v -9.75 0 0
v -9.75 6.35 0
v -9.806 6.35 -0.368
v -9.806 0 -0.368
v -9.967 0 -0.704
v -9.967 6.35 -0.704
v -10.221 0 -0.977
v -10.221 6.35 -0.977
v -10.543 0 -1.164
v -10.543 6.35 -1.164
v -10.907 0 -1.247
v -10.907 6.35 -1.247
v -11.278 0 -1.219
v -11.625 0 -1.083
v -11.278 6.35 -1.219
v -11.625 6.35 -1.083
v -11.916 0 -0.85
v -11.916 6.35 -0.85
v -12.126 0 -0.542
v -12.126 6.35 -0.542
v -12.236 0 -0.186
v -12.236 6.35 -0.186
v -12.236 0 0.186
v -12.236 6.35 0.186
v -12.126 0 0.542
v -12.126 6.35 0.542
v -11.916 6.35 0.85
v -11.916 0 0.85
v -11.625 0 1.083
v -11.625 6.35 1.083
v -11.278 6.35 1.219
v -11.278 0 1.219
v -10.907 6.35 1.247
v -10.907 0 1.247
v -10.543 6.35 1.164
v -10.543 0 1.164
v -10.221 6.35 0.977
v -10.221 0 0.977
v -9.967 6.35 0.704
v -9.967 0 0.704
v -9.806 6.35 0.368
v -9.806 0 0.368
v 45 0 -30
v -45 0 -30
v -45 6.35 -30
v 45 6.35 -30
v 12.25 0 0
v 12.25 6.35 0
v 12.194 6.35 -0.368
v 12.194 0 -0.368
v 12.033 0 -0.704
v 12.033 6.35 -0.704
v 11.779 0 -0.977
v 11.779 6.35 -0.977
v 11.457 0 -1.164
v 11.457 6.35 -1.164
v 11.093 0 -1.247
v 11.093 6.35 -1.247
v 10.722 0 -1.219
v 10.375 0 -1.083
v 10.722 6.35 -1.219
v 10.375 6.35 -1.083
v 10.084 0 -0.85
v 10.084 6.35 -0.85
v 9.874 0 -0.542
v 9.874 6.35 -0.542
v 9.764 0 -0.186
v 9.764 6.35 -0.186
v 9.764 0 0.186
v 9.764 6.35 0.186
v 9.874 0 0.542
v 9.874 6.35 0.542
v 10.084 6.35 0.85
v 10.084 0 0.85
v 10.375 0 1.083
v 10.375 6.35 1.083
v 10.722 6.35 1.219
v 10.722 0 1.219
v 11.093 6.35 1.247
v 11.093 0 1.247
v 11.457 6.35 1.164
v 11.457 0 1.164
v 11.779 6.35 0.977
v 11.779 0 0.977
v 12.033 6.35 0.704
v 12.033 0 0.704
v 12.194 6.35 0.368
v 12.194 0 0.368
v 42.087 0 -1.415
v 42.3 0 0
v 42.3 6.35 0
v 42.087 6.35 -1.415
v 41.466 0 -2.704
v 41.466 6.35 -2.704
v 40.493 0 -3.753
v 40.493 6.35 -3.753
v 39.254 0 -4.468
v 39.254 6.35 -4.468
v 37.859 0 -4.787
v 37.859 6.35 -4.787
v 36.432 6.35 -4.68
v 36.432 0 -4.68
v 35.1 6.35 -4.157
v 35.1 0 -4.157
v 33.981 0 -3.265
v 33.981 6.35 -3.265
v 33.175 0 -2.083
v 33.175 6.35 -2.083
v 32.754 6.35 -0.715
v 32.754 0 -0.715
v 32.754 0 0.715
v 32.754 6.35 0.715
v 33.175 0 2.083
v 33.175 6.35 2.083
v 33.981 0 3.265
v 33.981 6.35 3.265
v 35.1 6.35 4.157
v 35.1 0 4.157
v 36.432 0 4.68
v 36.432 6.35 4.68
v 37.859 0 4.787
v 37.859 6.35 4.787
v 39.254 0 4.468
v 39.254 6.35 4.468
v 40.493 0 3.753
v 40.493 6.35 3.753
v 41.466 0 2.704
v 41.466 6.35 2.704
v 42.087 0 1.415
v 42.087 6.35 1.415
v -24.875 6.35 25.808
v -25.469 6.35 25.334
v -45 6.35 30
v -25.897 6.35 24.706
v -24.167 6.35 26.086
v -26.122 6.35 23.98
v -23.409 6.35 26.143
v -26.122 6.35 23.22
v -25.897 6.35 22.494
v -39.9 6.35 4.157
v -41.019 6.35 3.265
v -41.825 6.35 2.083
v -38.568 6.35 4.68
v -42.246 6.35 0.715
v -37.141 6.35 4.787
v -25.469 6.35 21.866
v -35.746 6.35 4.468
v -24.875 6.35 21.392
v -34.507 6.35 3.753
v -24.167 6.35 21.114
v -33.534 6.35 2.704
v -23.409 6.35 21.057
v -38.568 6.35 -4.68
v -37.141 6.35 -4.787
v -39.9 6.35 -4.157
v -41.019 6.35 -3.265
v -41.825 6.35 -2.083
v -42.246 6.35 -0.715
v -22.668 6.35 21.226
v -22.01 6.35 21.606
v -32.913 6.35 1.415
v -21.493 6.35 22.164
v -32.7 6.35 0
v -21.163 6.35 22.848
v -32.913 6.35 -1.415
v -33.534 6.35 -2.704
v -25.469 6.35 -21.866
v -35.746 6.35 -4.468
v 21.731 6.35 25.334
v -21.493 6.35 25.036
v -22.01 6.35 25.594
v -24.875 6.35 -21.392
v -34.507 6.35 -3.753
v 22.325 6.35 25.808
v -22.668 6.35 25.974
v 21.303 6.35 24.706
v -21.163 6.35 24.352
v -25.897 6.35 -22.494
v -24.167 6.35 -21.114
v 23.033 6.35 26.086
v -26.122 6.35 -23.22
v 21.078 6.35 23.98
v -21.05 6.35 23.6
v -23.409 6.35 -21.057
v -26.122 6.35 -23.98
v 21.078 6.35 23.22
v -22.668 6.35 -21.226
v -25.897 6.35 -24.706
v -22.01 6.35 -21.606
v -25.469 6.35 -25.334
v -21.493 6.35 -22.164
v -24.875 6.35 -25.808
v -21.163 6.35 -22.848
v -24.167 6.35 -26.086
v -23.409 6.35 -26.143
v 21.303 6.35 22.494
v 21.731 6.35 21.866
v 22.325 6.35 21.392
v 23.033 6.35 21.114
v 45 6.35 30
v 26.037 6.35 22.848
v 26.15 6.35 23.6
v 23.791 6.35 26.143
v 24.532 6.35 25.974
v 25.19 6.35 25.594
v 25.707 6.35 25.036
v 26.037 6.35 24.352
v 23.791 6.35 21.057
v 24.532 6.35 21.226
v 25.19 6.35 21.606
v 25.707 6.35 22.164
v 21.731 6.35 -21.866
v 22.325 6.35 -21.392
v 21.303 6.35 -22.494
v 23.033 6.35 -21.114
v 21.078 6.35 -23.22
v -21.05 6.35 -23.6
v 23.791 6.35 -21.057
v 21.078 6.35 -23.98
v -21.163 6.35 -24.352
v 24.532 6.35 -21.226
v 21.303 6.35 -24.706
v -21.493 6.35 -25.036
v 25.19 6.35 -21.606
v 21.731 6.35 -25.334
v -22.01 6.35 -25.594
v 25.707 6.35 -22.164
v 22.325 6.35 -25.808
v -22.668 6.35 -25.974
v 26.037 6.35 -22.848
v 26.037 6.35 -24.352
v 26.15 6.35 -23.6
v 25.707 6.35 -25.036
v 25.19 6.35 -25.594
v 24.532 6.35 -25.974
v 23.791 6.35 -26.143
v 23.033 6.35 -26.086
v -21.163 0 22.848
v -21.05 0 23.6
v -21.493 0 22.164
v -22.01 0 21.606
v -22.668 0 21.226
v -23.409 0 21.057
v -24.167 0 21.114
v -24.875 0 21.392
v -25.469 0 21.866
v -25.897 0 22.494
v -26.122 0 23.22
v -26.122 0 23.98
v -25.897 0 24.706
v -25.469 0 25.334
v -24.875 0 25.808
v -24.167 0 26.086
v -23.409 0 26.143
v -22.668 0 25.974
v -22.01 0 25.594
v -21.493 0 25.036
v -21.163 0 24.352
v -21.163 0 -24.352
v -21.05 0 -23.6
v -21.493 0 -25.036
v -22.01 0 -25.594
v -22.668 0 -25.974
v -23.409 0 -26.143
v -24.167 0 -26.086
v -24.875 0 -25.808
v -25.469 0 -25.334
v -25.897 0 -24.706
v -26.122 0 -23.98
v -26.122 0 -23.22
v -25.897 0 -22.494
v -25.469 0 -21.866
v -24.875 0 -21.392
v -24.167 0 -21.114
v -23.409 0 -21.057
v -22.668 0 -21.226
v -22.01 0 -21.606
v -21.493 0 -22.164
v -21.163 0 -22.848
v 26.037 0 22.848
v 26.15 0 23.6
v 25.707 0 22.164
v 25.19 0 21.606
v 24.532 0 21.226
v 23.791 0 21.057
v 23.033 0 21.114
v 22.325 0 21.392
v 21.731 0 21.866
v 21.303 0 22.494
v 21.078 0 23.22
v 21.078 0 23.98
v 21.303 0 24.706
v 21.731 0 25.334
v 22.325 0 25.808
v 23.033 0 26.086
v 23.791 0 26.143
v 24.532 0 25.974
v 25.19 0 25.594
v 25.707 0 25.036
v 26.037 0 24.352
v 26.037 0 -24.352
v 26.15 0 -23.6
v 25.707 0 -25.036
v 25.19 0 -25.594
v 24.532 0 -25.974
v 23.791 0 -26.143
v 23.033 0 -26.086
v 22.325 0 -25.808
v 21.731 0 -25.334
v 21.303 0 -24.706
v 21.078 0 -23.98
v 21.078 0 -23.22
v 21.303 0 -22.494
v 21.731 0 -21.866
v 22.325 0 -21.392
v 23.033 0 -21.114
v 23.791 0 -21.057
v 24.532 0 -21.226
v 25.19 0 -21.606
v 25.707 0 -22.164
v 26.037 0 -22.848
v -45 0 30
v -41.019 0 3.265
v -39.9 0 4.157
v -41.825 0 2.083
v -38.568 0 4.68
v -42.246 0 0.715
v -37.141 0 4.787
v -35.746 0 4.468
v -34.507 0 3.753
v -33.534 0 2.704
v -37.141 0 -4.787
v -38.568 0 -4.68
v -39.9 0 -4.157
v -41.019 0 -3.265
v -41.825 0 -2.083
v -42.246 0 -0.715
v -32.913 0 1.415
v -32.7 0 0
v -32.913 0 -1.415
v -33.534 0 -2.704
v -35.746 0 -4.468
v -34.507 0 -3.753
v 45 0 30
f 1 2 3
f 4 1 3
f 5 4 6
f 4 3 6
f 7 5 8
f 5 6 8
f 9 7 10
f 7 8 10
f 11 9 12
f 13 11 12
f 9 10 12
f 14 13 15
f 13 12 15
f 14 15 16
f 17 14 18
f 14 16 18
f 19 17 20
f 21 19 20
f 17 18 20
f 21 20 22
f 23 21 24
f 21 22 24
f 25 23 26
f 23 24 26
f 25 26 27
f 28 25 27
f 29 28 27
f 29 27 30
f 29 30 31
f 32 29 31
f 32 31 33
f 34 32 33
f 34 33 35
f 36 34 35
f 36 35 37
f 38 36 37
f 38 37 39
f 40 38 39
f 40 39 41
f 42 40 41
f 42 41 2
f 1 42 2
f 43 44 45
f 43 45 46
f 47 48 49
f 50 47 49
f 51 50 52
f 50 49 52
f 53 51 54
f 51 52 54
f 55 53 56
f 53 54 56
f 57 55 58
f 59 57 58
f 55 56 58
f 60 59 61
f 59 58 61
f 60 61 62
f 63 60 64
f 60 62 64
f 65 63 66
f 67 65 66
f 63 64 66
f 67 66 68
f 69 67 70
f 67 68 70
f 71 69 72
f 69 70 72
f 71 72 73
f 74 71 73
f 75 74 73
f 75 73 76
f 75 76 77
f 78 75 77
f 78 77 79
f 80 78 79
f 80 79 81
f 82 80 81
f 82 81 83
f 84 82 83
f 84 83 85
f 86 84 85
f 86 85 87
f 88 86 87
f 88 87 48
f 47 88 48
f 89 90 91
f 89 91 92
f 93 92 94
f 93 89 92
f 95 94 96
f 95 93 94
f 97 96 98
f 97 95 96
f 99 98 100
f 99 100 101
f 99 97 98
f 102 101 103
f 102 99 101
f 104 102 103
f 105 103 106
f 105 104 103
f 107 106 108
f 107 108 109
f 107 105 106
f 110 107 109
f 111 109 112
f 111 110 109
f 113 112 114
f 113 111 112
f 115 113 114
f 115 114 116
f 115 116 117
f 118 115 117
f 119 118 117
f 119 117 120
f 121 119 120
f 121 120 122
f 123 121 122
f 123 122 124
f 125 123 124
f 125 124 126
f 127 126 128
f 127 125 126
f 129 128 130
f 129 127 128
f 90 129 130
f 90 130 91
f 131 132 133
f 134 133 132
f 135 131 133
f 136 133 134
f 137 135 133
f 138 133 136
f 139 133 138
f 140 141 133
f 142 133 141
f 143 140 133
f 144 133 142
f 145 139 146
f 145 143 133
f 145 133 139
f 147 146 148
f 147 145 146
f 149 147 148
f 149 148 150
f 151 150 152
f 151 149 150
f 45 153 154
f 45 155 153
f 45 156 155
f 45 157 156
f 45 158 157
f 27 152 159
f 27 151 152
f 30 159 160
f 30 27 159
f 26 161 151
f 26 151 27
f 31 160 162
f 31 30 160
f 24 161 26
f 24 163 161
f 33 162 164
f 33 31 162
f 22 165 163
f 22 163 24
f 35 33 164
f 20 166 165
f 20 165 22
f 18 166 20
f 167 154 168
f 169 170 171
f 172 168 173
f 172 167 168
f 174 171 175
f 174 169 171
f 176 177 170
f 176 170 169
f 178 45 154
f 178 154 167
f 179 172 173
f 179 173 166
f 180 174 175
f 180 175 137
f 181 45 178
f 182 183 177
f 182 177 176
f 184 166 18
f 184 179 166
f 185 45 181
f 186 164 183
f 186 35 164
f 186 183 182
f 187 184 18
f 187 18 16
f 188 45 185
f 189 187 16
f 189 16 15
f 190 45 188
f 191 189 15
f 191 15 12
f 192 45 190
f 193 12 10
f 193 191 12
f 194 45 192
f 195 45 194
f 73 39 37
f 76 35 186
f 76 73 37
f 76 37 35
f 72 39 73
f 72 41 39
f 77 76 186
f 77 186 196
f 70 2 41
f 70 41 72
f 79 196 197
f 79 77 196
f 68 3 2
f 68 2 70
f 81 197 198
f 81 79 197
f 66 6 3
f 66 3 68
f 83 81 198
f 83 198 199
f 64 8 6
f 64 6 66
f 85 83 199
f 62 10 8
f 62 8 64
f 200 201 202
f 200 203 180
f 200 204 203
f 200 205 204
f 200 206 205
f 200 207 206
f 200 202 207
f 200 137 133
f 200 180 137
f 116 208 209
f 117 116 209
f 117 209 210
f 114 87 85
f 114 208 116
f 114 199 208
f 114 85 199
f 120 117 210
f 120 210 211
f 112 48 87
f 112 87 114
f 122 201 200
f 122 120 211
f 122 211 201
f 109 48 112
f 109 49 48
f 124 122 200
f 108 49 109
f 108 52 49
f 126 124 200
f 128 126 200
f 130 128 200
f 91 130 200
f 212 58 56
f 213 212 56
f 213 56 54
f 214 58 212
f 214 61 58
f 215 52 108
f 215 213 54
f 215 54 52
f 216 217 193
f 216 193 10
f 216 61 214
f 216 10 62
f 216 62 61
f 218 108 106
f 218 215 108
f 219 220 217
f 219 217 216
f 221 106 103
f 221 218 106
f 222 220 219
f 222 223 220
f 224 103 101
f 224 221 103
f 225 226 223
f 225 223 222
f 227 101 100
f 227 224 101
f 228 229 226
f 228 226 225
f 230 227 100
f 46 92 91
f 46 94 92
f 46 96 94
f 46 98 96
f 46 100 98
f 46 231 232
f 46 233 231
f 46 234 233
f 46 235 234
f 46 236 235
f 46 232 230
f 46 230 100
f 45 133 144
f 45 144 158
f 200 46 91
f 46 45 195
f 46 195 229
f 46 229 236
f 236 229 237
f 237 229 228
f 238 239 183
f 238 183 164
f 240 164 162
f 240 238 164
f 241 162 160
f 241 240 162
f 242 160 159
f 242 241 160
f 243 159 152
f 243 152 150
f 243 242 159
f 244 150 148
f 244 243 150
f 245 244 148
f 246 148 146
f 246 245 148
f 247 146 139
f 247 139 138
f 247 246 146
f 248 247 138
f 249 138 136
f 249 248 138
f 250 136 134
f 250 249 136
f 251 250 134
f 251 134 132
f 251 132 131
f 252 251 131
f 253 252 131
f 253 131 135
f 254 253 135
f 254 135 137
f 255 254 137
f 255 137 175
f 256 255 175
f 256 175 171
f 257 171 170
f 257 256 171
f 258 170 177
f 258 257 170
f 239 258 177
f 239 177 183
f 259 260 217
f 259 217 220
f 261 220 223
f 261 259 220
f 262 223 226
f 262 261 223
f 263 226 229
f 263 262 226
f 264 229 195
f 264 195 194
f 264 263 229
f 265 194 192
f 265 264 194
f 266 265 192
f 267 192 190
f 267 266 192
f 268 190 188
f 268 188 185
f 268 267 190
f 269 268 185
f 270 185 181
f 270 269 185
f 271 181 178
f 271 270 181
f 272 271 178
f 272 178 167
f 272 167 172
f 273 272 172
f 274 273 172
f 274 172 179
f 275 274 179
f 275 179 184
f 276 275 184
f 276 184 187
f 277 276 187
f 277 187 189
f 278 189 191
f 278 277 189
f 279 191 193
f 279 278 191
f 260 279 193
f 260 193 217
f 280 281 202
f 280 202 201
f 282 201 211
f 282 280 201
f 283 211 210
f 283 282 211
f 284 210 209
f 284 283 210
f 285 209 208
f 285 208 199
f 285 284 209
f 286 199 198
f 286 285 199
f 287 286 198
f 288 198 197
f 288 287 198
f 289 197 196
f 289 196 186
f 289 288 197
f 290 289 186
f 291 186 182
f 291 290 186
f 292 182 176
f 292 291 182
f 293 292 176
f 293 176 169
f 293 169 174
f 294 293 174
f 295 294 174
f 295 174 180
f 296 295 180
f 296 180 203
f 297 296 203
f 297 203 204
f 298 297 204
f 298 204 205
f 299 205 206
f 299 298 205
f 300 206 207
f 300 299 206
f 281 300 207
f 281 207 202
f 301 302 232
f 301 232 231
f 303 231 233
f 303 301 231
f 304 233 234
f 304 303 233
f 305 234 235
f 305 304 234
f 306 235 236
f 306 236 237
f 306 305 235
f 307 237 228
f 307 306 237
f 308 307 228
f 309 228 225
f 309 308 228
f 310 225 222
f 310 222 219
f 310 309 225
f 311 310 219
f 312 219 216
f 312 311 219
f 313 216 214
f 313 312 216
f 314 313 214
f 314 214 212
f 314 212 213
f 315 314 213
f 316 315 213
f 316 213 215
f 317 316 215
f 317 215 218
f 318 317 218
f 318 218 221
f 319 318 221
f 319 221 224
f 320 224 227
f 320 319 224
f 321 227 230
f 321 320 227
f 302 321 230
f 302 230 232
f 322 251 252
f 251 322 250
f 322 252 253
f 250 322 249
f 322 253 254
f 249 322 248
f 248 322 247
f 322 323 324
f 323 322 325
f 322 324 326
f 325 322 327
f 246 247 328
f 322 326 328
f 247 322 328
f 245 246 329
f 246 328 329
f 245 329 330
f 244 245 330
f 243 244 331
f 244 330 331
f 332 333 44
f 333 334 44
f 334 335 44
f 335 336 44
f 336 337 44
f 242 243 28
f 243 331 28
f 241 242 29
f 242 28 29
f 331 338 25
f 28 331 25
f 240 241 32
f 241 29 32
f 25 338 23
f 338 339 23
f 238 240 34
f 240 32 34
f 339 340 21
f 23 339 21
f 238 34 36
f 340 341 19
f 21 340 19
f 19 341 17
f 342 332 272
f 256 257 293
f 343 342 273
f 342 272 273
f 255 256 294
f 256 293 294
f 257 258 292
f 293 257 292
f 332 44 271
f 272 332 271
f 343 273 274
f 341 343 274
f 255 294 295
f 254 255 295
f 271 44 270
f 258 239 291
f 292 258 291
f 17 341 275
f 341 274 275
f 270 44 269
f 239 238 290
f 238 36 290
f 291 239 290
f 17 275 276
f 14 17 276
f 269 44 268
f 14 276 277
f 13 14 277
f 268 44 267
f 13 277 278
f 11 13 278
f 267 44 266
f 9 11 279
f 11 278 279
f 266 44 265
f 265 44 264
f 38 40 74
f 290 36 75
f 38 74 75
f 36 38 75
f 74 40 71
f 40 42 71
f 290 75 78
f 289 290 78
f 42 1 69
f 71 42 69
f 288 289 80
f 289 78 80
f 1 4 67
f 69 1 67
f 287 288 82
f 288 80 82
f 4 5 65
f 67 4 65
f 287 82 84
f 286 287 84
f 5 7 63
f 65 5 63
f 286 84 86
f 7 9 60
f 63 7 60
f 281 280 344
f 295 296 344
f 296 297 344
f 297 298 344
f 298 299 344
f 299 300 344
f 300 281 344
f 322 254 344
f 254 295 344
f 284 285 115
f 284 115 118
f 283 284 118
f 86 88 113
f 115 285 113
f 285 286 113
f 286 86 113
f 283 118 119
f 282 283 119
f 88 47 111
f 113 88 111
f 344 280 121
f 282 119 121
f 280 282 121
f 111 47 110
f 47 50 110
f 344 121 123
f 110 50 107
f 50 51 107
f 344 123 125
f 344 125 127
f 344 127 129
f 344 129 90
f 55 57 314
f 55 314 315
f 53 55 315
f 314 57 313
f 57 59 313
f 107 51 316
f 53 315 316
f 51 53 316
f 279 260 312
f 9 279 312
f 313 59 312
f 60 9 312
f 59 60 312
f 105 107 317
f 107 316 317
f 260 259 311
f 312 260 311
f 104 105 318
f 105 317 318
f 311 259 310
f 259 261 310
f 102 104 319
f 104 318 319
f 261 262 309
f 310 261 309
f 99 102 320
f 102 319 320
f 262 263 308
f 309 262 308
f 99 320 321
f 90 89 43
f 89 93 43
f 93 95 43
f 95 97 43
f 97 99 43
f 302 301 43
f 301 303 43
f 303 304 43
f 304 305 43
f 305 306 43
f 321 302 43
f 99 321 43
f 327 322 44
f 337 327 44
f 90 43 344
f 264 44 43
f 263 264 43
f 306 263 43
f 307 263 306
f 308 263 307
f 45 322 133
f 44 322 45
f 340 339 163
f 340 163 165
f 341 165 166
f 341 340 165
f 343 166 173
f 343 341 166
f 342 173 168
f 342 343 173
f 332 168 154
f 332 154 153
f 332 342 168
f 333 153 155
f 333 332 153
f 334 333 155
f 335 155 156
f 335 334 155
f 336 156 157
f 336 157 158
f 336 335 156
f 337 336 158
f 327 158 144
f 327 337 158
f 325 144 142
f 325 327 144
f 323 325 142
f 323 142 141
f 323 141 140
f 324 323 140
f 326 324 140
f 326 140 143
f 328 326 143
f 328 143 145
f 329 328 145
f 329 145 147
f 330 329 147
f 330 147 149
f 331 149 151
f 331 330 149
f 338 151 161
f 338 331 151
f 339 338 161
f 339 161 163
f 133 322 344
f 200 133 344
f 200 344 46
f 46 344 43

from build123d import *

# Parameters (mm, degrees)
SKETCH1_W           = 90
SKETCH1_H           = 60
SKETCH1_R           = 4.8
SKETCH1_R_2         = 2.55
BOSS_EXTRUDE1_DEPTH = 6.35
SKETCH3_R           = 1.25
CUT_EXTRUDE1_DEPTH  = 8


with BuildPart() as part:
    # Sketch1 → Boss-Extrude1 (new body)
    with BuildSketch(Plane(origin=(0, 0, 0), x_dir=(1, 0, 0), z_dir=(0, 1, 0))):
        Rectangle(SKETCH1_W, SKETCH1_H)
        with Locations((-37.5, 0)):
            Circle(SKETCH1_R, mode=Mode.SUBTRACT)
        with Locations((37.5, 0)):
            Circle(SKETCH1_R, mode=Mode.SUBTRACT)
        with Locations((-23.6, -23.6)):
            Circle(SKETCH1_R_2, mode=Mode.SUBTRACT)
        with Locations((23.6, -23.6)):
            Circle(SKETCH1_R_2, mode=Mode.SUBTRACT)
        with Locations((23.6, 23.6)):
            Circle(SKETCH1_R_2, mode=Mode.SUBTRACT)
        with Locations((-23.6, 23.6)):
            Circle(SKETCH1_R_2, mode=Mode.SUBTRACT)
    extrude(amount=BOSS_EXTRUDE1_DEPTH)

    # Sketch3 → Cut-Extrude1 (cut)
    with BuildSketch(Plane(origin=(0, 6.35, 0), x_dir=(1, 0, 0), z_dir=(0, 1, 0))):
        with Locations((-11, 0)):
            Circle(SKETCH3_R)
        with Locations((11, 0)):
            Circle(SKETCH3_R)
    extrude(amount=-CUT_EXTRUDE1_DEPTH, mode=Mode.SUBTRACT)


solid = part.part
